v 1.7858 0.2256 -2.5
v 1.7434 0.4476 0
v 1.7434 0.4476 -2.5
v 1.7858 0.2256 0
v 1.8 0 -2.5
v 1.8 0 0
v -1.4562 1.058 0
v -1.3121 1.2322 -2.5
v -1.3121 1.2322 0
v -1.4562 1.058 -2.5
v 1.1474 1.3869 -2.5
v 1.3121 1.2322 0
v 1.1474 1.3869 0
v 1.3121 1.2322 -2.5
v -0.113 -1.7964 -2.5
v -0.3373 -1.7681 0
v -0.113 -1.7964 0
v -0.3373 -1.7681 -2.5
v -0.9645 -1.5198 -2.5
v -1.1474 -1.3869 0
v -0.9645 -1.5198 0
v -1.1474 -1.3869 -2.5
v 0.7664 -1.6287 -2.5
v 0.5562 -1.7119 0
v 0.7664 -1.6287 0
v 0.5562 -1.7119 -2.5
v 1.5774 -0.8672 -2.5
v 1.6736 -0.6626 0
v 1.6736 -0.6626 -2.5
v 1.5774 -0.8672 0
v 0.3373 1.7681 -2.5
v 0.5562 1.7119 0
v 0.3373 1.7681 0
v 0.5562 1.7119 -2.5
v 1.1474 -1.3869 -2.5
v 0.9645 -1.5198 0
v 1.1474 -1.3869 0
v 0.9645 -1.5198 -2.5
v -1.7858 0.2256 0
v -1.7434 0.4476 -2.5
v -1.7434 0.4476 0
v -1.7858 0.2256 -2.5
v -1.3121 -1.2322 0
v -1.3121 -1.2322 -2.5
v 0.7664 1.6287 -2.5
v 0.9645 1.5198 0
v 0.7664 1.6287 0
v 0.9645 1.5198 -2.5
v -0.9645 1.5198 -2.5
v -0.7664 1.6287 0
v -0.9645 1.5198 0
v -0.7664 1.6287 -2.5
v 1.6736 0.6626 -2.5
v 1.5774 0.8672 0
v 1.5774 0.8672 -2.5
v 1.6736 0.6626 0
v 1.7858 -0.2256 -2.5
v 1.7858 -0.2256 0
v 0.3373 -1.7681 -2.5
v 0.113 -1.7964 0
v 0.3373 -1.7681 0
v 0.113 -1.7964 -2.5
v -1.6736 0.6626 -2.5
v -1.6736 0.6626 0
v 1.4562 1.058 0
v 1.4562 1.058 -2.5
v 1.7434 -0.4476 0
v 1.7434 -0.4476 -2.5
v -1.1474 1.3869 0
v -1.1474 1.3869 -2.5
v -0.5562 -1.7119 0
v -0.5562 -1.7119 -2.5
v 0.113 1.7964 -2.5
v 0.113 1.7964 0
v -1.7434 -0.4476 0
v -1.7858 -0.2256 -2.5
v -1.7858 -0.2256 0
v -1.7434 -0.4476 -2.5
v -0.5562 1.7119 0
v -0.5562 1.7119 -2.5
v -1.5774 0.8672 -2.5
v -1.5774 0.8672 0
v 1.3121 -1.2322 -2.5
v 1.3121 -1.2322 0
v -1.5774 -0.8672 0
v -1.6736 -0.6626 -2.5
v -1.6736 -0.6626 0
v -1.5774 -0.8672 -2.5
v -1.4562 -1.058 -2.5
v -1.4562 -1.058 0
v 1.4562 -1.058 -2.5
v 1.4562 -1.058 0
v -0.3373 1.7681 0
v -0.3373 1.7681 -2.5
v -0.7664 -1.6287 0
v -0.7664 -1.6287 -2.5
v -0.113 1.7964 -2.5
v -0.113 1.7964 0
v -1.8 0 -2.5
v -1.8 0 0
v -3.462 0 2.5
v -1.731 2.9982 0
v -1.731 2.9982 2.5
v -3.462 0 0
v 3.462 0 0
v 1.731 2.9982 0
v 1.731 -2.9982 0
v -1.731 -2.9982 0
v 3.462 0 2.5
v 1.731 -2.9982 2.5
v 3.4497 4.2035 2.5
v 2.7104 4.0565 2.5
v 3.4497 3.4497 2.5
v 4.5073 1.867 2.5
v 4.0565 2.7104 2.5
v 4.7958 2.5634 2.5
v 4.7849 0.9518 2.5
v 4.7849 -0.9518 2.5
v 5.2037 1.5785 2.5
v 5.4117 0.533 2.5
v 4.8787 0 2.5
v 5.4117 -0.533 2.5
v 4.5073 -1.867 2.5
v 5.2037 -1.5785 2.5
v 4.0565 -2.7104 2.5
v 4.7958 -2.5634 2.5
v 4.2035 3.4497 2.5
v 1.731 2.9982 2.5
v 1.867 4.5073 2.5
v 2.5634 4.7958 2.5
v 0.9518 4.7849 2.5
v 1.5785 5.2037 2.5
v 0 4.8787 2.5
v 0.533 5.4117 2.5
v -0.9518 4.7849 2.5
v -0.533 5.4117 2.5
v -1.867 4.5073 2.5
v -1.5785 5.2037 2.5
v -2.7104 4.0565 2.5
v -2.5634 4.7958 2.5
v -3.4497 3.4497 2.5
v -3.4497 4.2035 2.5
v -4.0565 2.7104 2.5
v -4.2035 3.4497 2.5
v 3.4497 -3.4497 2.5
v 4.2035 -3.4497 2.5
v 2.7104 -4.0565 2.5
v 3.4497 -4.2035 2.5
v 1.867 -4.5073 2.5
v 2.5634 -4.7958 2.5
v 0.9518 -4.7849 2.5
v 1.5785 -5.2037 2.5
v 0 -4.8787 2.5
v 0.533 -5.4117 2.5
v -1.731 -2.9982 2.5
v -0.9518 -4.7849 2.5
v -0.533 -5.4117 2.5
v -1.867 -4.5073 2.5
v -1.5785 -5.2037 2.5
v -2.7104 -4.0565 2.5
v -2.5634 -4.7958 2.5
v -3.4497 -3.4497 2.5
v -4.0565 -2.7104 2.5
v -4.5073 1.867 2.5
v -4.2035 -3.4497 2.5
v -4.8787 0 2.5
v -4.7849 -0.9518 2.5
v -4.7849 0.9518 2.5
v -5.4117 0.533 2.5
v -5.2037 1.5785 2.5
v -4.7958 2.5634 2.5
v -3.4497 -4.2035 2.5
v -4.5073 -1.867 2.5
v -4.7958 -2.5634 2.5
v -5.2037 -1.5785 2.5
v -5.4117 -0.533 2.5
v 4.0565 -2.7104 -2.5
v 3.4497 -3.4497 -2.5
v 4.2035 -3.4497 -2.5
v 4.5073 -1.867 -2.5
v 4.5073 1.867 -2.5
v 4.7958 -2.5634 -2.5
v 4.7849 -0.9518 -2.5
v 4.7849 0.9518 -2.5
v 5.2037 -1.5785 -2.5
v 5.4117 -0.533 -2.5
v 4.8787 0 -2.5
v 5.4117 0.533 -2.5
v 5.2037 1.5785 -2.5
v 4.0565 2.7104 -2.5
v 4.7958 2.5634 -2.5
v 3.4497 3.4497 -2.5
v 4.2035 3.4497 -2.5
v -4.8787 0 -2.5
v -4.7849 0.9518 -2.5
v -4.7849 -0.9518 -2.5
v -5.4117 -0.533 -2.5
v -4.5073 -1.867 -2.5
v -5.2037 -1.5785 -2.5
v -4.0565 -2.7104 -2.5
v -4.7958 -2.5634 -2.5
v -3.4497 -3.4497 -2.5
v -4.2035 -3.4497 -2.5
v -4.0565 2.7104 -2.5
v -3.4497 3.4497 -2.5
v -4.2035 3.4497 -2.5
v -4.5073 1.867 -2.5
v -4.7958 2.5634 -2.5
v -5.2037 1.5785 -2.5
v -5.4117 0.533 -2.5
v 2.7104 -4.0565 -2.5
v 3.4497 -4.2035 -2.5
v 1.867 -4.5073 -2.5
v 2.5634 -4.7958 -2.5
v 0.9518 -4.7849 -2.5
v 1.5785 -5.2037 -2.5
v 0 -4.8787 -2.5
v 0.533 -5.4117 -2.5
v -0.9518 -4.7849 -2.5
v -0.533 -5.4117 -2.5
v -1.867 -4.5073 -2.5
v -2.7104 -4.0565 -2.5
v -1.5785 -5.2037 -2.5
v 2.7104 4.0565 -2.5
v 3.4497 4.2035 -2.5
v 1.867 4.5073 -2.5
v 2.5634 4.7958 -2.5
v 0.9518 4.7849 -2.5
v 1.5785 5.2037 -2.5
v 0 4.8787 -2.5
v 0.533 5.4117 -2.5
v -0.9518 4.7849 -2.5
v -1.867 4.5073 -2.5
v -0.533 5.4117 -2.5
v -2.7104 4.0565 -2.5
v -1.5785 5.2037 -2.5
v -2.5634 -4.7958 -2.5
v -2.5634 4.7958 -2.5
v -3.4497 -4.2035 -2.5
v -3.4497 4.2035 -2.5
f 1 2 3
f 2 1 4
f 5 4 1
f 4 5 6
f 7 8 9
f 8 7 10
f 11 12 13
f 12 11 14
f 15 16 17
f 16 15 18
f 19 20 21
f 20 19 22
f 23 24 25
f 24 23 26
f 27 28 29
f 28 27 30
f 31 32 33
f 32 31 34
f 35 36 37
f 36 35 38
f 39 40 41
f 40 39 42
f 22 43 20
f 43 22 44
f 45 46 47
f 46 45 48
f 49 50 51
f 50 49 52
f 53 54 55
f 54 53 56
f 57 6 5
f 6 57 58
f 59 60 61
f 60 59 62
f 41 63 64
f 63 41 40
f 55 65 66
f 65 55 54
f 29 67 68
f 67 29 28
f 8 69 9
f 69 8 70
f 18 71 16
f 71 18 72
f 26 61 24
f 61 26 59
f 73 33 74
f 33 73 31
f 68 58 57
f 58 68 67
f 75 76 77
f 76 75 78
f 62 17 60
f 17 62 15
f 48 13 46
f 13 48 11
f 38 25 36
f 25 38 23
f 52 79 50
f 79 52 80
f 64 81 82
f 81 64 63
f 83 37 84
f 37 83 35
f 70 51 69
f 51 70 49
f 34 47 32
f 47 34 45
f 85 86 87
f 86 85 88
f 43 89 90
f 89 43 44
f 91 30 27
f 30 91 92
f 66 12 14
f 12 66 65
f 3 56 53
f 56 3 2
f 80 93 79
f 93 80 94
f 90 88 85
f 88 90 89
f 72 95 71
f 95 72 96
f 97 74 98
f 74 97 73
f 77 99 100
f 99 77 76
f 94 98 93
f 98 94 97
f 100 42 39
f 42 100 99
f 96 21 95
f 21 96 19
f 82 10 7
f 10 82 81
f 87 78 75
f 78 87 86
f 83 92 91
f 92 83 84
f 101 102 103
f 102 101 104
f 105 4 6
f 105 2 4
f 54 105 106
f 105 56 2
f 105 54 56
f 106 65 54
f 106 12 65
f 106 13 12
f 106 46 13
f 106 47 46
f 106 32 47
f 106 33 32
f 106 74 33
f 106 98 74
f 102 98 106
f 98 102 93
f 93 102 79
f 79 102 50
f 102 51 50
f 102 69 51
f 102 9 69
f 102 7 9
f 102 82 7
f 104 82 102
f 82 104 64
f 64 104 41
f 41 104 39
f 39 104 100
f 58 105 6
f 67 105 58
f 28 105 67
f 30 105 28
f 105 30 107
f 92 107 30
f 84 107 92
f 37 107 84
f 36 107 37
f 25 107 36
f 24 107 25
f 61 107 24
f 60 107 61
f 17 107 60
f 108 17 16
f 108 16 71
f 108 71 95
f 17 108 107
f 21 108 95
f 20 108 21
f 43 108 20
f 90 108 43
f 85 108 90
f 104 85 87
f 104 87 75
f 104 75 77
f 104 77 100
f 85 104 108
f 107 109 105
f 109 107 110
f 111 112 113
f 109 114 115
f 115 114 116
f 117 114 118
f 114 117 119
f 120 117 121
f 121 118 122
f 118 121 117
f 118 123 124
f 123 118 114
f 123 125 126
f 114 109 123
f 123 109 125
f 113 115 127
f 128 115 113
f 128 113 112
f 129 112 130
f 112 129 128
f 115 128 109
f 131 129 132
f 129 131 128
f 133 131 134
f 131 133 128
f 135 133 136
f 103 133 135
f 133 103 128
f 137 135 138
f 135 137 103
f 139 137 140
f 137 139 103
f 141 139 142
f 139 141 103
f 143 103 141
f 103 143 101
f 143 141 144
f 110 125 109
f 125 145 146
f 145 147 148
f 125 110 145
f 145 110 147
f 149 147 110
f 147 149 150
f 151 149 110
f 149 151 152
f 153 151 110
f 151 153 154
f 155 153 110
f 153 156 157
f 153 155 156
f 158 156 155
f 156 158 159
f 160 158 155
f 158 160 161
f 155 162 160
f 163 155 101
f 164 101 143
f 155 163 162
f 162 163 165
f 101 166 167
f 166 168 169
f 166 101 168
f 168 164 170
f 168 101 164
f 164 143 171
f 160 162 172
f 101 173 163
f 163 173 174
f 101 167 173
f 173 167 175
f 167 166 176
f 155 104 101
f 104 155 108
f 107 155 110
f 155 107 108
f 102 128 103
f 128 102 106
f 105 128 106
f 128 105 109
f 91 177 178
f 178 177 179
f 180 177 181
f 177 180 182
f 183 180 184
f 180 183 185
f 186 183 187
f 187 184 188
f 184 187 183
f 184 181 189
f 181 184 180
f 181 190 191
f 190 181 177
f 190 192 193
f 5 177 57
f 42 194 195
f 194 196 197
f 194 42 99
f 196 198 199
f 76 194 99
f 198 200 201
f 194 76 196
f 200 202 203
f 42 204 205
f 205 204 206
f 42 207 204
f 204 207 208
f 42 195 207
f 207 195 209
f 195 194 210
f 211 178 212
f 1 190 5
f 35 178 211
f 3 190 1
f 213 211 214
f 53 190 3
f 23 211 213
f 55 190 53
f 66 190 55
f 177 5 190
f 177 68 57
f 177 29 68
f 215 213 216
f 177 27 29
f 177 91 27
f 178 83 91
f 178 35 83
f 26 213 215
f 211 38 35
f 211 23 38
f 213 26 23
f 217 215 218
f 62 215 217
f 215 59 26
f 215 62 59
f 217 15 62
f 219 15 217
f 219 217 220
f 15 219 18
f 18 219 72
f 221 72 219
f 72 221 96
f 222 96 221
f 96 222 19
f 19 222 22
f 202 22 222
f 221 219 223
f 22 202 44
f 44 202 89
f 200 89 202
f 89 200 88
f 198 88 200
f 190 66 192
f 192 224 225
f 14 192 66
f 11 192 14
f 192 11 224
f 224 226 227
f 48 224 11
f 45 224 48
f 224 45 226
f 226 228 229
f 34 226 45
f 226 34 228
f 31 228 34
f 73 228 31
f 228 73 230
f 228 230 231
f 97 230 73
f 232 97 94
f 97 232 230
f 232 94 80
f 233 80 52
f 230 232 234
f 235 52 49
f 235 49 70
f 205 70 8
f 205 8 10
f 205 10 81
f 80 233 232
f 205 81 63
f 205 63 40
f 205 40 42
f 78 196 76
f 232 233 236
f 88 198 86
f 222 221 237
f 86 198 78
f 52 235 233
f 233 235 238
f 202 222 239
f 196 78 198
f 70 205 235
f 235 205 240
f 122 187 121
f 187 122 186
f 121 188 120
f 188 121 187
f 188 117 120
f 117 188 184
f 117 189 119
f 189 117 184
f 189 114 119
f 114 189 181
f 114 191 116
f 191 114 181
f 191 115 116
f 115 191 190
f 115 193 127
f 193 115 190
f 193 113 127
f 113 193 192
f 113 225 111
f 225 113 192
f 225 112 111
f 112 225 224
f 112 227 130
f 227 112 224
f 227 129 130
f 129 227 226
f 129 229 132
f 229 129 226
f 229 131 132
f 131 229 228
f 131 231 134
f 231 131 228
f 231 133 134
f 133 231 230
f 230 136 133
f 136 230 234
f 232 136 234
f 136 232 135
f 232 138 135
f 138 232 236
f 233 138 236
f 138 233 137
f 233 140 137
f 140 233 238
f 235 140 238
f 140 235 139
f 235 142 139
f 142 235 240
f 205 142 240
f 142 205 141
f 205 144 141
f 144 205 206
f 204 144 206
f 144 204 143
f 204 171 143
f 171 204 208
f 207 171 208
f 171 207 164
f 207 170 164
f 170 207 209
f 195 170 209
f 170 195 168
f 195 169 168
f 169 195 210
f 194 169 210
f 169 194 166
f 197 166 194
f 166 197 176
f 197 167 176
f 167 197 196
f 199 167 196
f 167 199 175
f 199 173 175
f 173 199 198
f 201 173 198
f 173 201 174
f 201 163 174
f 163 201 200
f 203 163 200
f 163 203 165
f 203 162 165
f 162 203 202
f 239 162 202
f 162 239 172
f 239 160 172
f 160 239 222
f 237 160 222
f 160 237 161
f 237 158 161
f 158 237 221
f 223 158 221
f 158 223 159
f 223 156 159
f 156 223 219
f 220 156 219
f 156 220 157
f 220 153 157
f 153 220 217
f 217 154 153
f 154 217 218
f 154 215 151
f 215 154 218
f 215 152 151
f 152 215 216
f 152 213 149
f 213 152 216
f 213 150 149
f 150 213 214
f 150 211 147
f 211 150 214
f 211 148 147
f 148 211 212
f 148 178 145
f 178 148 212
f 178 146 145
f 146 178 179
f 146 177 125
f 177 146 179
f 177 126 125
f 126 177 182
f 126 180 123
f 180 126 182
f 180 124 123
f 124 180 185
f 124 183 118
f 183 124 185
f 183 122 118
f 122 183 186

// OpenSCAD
$fn = 50;


difference() {
	union() {
		translate(v = [0, 0, -2.5000000000]) {
			cylinder(h = 5, r = 5.5000000000);
		}
	}
	union() {
		translate(v = [0, 0, 0]) {
			rotate(a = [0, 0, 0]) {
				difference() {
					union() {
						translate(v = [0, 0, -100.0000000000]) {
							cylinder(h = 200, r = 1.8000000000);
						}
						linear_extrude(height = 2.5000000000) {
							polygon(points = [[3.4620000000, 0.0000000000], [1.7310000000, 2.9981799479], [-1.7310000000, 2.9981799479], [-3.4620000000, 0.0000000000], [-1.7310000000, -2.9981799479], [1.7310000000, -2.9981799479]]);
						}
						translate(v = [0, 0, -100.0000000000]) {
							cylinder(h = 200, r = 1.8000000000);
						}
						translate(v = [0, 0, -100.0000000000]) {
							cylinder(h = 200, r = 1.8000000000);
						}
					}
					union();
				}
			}
		}
		rotate(a = [0, 0, 0.0000000000]) {
			translate(v = [7.0000000000, 0, 0]) {
				translate(v = [0, 0, 0]) {
					rotate(a = [0, 0, 45]) {
						difference() {
							union() {
								translate(v = [-1.5000000000, -1.5000000000, -2.5000000000]) {
									cube(size = [3, 3, 5]);
								}
							}
							union();
						}
					}
				}
			}
		}
		rotate(a = [0, 0, 11.2500000000]) {
			translate(v = [7.0000000000, 0, 0]) {
				translate(v = [0, 0, 0]) {
					rotate(a = [0, 0, 45]) {
						difference() {
							union() {
								translate(v = [-1.5000000000, -1.5000000000, -2.5000000000]) {
									cube(size = [3, 3, 5]);
								}
							}
							union();
						}
					}
				}
			}
		}
		rotate(a = [0, 0, 22.5000000000]) {
			translate(v = [7.0000000000, 0, 0]) {
				translate(v = [0, 0, 0]) {
					rotate(a = [0, 0, 45]) {
						difference() {
							union() {
								translate(v = [-1.5000000000, -1.5000000000, -2.5000000000]) {
									cube(size = [3, 3, 5]);
								}
							}
							union();
						}
					}
				}
			}
		}
		rotate(a = [0, 0, 33.7500000000]) {
			translate(v = [7.0000000000, 0, 0]) {
				translate(v = [0, 0, 0]) {
					rotate(a = [0, 0, 45]) {
						difference() {
							union() {
								translate(v = [-1.5000000000, -1.5000000000, -2.5000000000]) {
									cube(size = [3, 3, 5]);
								}
							}
							union();
						}
					}
				}
			}
		}
		rotate(a = [0, 0, 45.0000000000]) {
			translate(v = [7.0000000000, 0, 0]) {
				translate(v = [0, 0, 0]) {
					rotate(a = [0, 0, 45]) {
						difference() {
							union() {
								translate(v = [-1.5000000000, -1.5000000000, -2.5000000000]) {
									cube(size = [3, 3, 5]);
								}
							}
							union();
						}
					}
				}
			}
		}
		rotate(a = [0, 0, 56.2500000000]) {
			translate(v = [7.0000000000, 0, 0]) {
				translate(v = [0, 0, 0]) {
					rotate(a = [0, 0, 45]) {
						difference() {
							union() {
								translate(v = [-1.5000000000, -1.5000000000, -2.5000000000]) {
									cube(size = [3, 3, 5]);
								}
							}
							union();
						}
					}
				}
			}
		}
		rotate(a = [0, 0, 67.5000000000]) {
			translate(v = [7.0000000000, 0, 0]) {
				translate(v = [0, 0, 0]) {
					rotate(a = [0, 0, 45]) {
						difference() {
							union() {
								translate(v = [-1.5000000000, -1.5000000000, -2.5000000000]) {
									cube(size = [3, 3, 5]);
								}
							}
							union();
						}
					}
				}
			}
		}
		rotate(a = [0, 0, 78.7500000000]) {
			translate(v = [7.0000000000, 0, 0]) {
				translate(v = [0, 0, 0]) {
					rotate(a = [0, 0, 45]) {
						difference() {
							union() {
								translate(v = [-1.5000000000, -1.5000000000, -2.5000000000]) {
									cube(size = [3, 3, 5]);
								}
							}
							union();
						}
					}
				}
			}
		}
		rotate(a = [0, 0, 90.0000000000]) {
			translate(v = [7.0000000000, 0, 0]) {
				translate(v = [0, 0, 0]) {
					rotate(a = [0, 0, 45]) {
						difference() {
							union() {
								translate(v = [-1.5000000000, -1.5000000000, -2.5000000000]) {
									cube(size = [3, 3, 5]);
								}
							}
							union();
						}
					}
				}
			}
		}
		rotate(a = [0, 0, 101.2500000000]) {
			translate(v = [7.0000000000, 0, 0]) {
				translate(v = [0, 0, 0]) {
					rotate(a = [0, 0, 45]) {
						difference() {
							union() {
								translate(v = [-1.5000000000, -1.5000000000, -2.5000000000]) {
									cube(size = [3, 3, 5]);
								}
							}
							union();
						}
					}
				}
			}
		}
		rotate(a = [0, 0, 112.5000000000]) {
			translate(v = [7.0000000000, 0, 0]) {
				translate(v = [0, 0, 0]) {
					rotate(a = [0, 0, 45]) {
						difference() {
							union() {
								translate(v = [-1.5000000000, -1.5000000000, -2.5000000000]) {
									cube(size = [3, 3, 5]);
								}
							}
							union();
						}
					}
				}
			}
		}
		rotate(a = [0, 0, 123.7500000000]) {
			translate(v = [7.0000000000, 0, 0]) {
				translate(v = [0, 0, 0]) {
					rotate(a = [0, 0, 45]) {
						difference() {
							union() {
								translate(v = [-1.5000000000, -1.5000000000, -2.5000000000]) {
									cube(size = [3, 3, 5]);
								}
							}
							union();
						}
					}
				}
			}
		}
		rotate(a = [0, 0, 135.0000000000]) {
			translate(v = [7.0000000000, 0, 0]) {
				translate(v = [0, 0, 0]) {
					rotate(a = [0, 0, 45]) {
						difference() {
							union() {
								translate(v = [-1.5000000000, -1.5000000000, -2.5000000000]) {
									cube(size = [3, 3, 5]);
								}
							}
							union();
						}
					}
				}
			}
		}
		rotate(a = [0, 0, 146.2500000000]) {
			translate(v = [7.0000000000, 0, 0]) {
				translate(v = [0, 0, 0]) {
					rotate(a = [0, 0, 45]) {
						difference() {
							union() {
								translate(v = [-1.5000000000, -1.5000000000, -2.5000000000]) {
									cube(size = [3, 3, 5]);
								}
							}
							union();
						}
					}
				}
			}
		}
		rotate(a = [0, 0, 157.5000000000]) {
			translate(v = [7.0000000000, 0, 0]) {
				translate(v = [0, 0, 0]) {
					rotate(a = [0, 0, 45]) {
						difference() {
							union() {
								translate(v = [-1.5000000000, -1.5000000000, -2.5000000000]) {
									cube(size = [3, 3, 5]);
								}
							}
							union();
						}
					}
				}
			}
		}
		rotate(a = [0, 0, 168.7500000000]) {
			translate(v = [7.0000000000, 0, 0]) {
				translate(v = [0, 0, 0]) {
					rotate(a = [0, 0, 45]) {
						difference() {
							union() {
								translate(v = [-1.5000000000, -1.5000000000, -2.5000000000]) {
									cube(size = [3, 3, 5]);
								}
							}
							union();
						}
					}
				}
			}
		}
		rotate(a = [0, 0, 180.0000000000]) {
			translate(v = [7.0000000000, 0, 0]) {
				translate(v = [0, 0, 0]) {
					rotate(a = [0, 0, 45]) {
						difference() {
							union() {
								translate(v = [-1.5000000000, -1.5000000000, -2.5000000000]) {
									cube(size = [3, 3, 5]);
								}
							}
							union();
						}
					}
				}
			}
		}
		rotate(a = [0, 0, 191.2500000000]) {
			translate(v = [7.0000000000, 0, 0]) {
				translate(v = [0, 0, 0]) {
					rotate(a = [0, 0, 45]) {
						difference() {
							union() {
								translate(v = [-1.5000000000, -1.5000000000, -2.5000000000]) {
									cube(size = [3, 3, 5]);
								}
							}
							union();
						}
					}
				}
			}
		}
		rotate(a = [0, 0, 202.5000000000]) {
			translate(v = [7.0000000000, 0, 0]) {
				translate(v = [0, 0, 0]) {
					rotate(a = [0, 0, 45]) {
						difference() {
							union() {
								translate(v = [-1.5000000000, -1.5000000000, -2.5000000000]) {
									cube(size = [3, 3, 5]);
								}
							}
							union();
						}
					}
				}
			}
		}
		rotate(a = [0, 0, 213.7500000000]) {
			translate(v = [7.0000000000, 0, 0]) {
				translate(v = [0, 0, 0]) {
					rotate(a = [0, 0, 45]) {
						difference() {
							union() {
								translate(v = [-1.5000000000, -1.5000000000, -2.5000000000]) {
									cube(size = [3, 3, 5]);
								}
							}
							union();
						}
					}
				}
			}
		}
		rotate(a = [0, 0, 225.0000000000]) {
			translate(v = [7.0000000000, 0, 0]) {
				translate(v = [0, 0, 0]) {
					rotate(a = [0, 0, 45]) {
						difference() {
							union() {
								translate(v = [-1.5000000000, -1.5000000000, -2.5000000000]) {
									cube(size = [3, 3, 5]);
								}
							}
							union();
						}
					}
				}
			}
		}
		rotate(a = [0, 0, 236.2500000000]) {
			translate(v = [7.0000000000, 0, 0]) {
				translate(v = [0, 0, 0]) {
					rotate(a = [0, 0, 45]) {
						difference() {
							union() {
								translate(v = [-1.5000000000, -1.5000000000, -2.5000000000]) {
									cube(size = [3, 3, 5]);
								}
							}
							union();
						}
					}
				}
			}
		}
		rotate(a = [0, 0, 247.5000000000]) {
			translate(v = [7.0000000000, 0, 0]) {
				translate(v = [0, 0, 0]) {
					rotate(a = [0, 0, 45]) {
						difference() {
							union() {
								translate(v = [-1.5000000000, -1.5000000000, -2.5000000000]) {
									cube(size = [3, 3, 5]);
								}
							}
							union();
						}
					}
				}
			}
		}
		rotate(a = [0, 0, 258.7500000000]) {
			translate(v = [7.0000000000, 0, 0]) {
				translate(v = [0, 0, 0]) {
					rotate(a = [0, 0, 45]) {
						difference() {
							union() {
								translate(v = [-1.5000000000, -1.5000000000, -2.5000000000]) {
									cube(size = [3, 3, 5]);
								}
							}
							union();
						}
					}
				}
			}
		}
		rotate(a = [0, 0, 270.0000000000]) {
			translate(v = [7.0000000000, 0, 0]) {
				translate(v = [0, 0, 0]) {
					rotate(a = [0, 0, 45]) {
						difference() {
							union() {
								translate(v = [-1.5000000000, -1.5000000000, -2.5000000000]) {
									cube(size = [3, 3, 5]);
								}
							}
							union();
						}
					}
				}
			}
		}
		rotate(a = [0, 0, 281.2500000000]) {
			translate(v = [7.0000000000, 0, 0]) {
				translate(v = [0, 0, 0]) {
					rotate(a = [0, 0, 45]) {
						difference() {
							union() {
								translate(v = [-1.5000000000, -1.5000000000, -2.5000000000]) {
									cube(size = [3, 3, 5]);
								}
							}
							union();
						}
					}
				}
			}
		}
		rotate(a = [0, 0, 292.5000000000]) {
			translate(v = [7.0000000000, 0, 0]) {
				translate(v = [0, 0, 0]) {
					rotate(a = [0, 0, 45]) {
						difference() {
							union() {
								translate(v = [-1.5000000000, -1.5000000000, -2.5000000000]) {
									cube(size = [3, 3, 5]);
								}
							}
							union();
						}
					}
				}
			}
		}
		rotate(a = [0, 0, 303.7500000000]) {
			translate(v = [7.0000000000, 0, 0]) {
				translate(v = [0, 0, 0]) {
					rotate(a = [0, 0, 45]) {
						difference() {
							union() {
								translate(v = [-1.5000000000, -1.5000000000, -2.5000000000]) {
									cube(size = [3, 3, 5]);
								}
							}
							union();
						}
					}
				}
			}
		}
		rotate(a = [0, 0, 315.0000000000]) {
			translate(v = [7.0000000000, 0, 0]) {
				translate(v = [0, 0, 0]) {
					rotate(a = [0, 0, 45]) {
						difference() {
							union() {
								translate(v = [-1.5000000000, -1.5000000000, -2.5000000000]) {
									cube(size = [3, 3, 5]);
								}
							}
							union();
						}
					}
				}
			}
		}
		rotate(a = [0, 0, 326.2500000000]) {
			translate(v = [7.0000000000, 0, 0]) {
				translate(v = [0, 0, 0]) {
					rotate(a = [0, 0, 45]) {
						difference() {
							union() {
								translate(v = [-1.5000000000, -1.5000000000, -2.5000000000]) {
									cube(size = [3, 3, 5]);
								}
							}
							union();
						}
					}
				}
			}
		}
		rotate(a = [0, 0, 337.5000000000]) {
			translate(v = [7.0000000000, 0, 0]) {
				translate(v = [0, 0, 0]) {
					rotate(a = [0, 0, 45]) {
						difference() {
							union() {
								translate(v = [-1.5000000000, -1.5000000000, -2.5000000000]) {
									cube(size = [3, 3, 5]);
								}
							}
							union();
						}
					}
				}
			}
		}
		rotate(a = [0, 0, 348.7500000000]) {
			translate(v = [7.0000000000, 0, 0]) {
				translate(v = [0, 0, 0]) {
					rotate(a = [0, 0, 45]) {
						difference() {
							union() {
								translate(v = [-1.5000000000, -1.5000000000, -2.5000000000]) {
									cube(size = [3, 3, 5]);
								}
							}
							union();
						}
					}
				}
			}
		}
		rotate(a = [0, 0, 360.0000000000]) {
			translate(v = [7.0000000000, 0, 0]) {
				translate(v = [0, 0, 0]) {
					rotate(a = [0, 0, 45]) {
						difference() {
							union() {
								translate(v = [-1.5000000000, -1.5000000000, -2.5000000000]) {
									cube(size = [3, 3, 5]);
								}
							}
							union();
						}
					}
				}
			}
		}
	}
}
